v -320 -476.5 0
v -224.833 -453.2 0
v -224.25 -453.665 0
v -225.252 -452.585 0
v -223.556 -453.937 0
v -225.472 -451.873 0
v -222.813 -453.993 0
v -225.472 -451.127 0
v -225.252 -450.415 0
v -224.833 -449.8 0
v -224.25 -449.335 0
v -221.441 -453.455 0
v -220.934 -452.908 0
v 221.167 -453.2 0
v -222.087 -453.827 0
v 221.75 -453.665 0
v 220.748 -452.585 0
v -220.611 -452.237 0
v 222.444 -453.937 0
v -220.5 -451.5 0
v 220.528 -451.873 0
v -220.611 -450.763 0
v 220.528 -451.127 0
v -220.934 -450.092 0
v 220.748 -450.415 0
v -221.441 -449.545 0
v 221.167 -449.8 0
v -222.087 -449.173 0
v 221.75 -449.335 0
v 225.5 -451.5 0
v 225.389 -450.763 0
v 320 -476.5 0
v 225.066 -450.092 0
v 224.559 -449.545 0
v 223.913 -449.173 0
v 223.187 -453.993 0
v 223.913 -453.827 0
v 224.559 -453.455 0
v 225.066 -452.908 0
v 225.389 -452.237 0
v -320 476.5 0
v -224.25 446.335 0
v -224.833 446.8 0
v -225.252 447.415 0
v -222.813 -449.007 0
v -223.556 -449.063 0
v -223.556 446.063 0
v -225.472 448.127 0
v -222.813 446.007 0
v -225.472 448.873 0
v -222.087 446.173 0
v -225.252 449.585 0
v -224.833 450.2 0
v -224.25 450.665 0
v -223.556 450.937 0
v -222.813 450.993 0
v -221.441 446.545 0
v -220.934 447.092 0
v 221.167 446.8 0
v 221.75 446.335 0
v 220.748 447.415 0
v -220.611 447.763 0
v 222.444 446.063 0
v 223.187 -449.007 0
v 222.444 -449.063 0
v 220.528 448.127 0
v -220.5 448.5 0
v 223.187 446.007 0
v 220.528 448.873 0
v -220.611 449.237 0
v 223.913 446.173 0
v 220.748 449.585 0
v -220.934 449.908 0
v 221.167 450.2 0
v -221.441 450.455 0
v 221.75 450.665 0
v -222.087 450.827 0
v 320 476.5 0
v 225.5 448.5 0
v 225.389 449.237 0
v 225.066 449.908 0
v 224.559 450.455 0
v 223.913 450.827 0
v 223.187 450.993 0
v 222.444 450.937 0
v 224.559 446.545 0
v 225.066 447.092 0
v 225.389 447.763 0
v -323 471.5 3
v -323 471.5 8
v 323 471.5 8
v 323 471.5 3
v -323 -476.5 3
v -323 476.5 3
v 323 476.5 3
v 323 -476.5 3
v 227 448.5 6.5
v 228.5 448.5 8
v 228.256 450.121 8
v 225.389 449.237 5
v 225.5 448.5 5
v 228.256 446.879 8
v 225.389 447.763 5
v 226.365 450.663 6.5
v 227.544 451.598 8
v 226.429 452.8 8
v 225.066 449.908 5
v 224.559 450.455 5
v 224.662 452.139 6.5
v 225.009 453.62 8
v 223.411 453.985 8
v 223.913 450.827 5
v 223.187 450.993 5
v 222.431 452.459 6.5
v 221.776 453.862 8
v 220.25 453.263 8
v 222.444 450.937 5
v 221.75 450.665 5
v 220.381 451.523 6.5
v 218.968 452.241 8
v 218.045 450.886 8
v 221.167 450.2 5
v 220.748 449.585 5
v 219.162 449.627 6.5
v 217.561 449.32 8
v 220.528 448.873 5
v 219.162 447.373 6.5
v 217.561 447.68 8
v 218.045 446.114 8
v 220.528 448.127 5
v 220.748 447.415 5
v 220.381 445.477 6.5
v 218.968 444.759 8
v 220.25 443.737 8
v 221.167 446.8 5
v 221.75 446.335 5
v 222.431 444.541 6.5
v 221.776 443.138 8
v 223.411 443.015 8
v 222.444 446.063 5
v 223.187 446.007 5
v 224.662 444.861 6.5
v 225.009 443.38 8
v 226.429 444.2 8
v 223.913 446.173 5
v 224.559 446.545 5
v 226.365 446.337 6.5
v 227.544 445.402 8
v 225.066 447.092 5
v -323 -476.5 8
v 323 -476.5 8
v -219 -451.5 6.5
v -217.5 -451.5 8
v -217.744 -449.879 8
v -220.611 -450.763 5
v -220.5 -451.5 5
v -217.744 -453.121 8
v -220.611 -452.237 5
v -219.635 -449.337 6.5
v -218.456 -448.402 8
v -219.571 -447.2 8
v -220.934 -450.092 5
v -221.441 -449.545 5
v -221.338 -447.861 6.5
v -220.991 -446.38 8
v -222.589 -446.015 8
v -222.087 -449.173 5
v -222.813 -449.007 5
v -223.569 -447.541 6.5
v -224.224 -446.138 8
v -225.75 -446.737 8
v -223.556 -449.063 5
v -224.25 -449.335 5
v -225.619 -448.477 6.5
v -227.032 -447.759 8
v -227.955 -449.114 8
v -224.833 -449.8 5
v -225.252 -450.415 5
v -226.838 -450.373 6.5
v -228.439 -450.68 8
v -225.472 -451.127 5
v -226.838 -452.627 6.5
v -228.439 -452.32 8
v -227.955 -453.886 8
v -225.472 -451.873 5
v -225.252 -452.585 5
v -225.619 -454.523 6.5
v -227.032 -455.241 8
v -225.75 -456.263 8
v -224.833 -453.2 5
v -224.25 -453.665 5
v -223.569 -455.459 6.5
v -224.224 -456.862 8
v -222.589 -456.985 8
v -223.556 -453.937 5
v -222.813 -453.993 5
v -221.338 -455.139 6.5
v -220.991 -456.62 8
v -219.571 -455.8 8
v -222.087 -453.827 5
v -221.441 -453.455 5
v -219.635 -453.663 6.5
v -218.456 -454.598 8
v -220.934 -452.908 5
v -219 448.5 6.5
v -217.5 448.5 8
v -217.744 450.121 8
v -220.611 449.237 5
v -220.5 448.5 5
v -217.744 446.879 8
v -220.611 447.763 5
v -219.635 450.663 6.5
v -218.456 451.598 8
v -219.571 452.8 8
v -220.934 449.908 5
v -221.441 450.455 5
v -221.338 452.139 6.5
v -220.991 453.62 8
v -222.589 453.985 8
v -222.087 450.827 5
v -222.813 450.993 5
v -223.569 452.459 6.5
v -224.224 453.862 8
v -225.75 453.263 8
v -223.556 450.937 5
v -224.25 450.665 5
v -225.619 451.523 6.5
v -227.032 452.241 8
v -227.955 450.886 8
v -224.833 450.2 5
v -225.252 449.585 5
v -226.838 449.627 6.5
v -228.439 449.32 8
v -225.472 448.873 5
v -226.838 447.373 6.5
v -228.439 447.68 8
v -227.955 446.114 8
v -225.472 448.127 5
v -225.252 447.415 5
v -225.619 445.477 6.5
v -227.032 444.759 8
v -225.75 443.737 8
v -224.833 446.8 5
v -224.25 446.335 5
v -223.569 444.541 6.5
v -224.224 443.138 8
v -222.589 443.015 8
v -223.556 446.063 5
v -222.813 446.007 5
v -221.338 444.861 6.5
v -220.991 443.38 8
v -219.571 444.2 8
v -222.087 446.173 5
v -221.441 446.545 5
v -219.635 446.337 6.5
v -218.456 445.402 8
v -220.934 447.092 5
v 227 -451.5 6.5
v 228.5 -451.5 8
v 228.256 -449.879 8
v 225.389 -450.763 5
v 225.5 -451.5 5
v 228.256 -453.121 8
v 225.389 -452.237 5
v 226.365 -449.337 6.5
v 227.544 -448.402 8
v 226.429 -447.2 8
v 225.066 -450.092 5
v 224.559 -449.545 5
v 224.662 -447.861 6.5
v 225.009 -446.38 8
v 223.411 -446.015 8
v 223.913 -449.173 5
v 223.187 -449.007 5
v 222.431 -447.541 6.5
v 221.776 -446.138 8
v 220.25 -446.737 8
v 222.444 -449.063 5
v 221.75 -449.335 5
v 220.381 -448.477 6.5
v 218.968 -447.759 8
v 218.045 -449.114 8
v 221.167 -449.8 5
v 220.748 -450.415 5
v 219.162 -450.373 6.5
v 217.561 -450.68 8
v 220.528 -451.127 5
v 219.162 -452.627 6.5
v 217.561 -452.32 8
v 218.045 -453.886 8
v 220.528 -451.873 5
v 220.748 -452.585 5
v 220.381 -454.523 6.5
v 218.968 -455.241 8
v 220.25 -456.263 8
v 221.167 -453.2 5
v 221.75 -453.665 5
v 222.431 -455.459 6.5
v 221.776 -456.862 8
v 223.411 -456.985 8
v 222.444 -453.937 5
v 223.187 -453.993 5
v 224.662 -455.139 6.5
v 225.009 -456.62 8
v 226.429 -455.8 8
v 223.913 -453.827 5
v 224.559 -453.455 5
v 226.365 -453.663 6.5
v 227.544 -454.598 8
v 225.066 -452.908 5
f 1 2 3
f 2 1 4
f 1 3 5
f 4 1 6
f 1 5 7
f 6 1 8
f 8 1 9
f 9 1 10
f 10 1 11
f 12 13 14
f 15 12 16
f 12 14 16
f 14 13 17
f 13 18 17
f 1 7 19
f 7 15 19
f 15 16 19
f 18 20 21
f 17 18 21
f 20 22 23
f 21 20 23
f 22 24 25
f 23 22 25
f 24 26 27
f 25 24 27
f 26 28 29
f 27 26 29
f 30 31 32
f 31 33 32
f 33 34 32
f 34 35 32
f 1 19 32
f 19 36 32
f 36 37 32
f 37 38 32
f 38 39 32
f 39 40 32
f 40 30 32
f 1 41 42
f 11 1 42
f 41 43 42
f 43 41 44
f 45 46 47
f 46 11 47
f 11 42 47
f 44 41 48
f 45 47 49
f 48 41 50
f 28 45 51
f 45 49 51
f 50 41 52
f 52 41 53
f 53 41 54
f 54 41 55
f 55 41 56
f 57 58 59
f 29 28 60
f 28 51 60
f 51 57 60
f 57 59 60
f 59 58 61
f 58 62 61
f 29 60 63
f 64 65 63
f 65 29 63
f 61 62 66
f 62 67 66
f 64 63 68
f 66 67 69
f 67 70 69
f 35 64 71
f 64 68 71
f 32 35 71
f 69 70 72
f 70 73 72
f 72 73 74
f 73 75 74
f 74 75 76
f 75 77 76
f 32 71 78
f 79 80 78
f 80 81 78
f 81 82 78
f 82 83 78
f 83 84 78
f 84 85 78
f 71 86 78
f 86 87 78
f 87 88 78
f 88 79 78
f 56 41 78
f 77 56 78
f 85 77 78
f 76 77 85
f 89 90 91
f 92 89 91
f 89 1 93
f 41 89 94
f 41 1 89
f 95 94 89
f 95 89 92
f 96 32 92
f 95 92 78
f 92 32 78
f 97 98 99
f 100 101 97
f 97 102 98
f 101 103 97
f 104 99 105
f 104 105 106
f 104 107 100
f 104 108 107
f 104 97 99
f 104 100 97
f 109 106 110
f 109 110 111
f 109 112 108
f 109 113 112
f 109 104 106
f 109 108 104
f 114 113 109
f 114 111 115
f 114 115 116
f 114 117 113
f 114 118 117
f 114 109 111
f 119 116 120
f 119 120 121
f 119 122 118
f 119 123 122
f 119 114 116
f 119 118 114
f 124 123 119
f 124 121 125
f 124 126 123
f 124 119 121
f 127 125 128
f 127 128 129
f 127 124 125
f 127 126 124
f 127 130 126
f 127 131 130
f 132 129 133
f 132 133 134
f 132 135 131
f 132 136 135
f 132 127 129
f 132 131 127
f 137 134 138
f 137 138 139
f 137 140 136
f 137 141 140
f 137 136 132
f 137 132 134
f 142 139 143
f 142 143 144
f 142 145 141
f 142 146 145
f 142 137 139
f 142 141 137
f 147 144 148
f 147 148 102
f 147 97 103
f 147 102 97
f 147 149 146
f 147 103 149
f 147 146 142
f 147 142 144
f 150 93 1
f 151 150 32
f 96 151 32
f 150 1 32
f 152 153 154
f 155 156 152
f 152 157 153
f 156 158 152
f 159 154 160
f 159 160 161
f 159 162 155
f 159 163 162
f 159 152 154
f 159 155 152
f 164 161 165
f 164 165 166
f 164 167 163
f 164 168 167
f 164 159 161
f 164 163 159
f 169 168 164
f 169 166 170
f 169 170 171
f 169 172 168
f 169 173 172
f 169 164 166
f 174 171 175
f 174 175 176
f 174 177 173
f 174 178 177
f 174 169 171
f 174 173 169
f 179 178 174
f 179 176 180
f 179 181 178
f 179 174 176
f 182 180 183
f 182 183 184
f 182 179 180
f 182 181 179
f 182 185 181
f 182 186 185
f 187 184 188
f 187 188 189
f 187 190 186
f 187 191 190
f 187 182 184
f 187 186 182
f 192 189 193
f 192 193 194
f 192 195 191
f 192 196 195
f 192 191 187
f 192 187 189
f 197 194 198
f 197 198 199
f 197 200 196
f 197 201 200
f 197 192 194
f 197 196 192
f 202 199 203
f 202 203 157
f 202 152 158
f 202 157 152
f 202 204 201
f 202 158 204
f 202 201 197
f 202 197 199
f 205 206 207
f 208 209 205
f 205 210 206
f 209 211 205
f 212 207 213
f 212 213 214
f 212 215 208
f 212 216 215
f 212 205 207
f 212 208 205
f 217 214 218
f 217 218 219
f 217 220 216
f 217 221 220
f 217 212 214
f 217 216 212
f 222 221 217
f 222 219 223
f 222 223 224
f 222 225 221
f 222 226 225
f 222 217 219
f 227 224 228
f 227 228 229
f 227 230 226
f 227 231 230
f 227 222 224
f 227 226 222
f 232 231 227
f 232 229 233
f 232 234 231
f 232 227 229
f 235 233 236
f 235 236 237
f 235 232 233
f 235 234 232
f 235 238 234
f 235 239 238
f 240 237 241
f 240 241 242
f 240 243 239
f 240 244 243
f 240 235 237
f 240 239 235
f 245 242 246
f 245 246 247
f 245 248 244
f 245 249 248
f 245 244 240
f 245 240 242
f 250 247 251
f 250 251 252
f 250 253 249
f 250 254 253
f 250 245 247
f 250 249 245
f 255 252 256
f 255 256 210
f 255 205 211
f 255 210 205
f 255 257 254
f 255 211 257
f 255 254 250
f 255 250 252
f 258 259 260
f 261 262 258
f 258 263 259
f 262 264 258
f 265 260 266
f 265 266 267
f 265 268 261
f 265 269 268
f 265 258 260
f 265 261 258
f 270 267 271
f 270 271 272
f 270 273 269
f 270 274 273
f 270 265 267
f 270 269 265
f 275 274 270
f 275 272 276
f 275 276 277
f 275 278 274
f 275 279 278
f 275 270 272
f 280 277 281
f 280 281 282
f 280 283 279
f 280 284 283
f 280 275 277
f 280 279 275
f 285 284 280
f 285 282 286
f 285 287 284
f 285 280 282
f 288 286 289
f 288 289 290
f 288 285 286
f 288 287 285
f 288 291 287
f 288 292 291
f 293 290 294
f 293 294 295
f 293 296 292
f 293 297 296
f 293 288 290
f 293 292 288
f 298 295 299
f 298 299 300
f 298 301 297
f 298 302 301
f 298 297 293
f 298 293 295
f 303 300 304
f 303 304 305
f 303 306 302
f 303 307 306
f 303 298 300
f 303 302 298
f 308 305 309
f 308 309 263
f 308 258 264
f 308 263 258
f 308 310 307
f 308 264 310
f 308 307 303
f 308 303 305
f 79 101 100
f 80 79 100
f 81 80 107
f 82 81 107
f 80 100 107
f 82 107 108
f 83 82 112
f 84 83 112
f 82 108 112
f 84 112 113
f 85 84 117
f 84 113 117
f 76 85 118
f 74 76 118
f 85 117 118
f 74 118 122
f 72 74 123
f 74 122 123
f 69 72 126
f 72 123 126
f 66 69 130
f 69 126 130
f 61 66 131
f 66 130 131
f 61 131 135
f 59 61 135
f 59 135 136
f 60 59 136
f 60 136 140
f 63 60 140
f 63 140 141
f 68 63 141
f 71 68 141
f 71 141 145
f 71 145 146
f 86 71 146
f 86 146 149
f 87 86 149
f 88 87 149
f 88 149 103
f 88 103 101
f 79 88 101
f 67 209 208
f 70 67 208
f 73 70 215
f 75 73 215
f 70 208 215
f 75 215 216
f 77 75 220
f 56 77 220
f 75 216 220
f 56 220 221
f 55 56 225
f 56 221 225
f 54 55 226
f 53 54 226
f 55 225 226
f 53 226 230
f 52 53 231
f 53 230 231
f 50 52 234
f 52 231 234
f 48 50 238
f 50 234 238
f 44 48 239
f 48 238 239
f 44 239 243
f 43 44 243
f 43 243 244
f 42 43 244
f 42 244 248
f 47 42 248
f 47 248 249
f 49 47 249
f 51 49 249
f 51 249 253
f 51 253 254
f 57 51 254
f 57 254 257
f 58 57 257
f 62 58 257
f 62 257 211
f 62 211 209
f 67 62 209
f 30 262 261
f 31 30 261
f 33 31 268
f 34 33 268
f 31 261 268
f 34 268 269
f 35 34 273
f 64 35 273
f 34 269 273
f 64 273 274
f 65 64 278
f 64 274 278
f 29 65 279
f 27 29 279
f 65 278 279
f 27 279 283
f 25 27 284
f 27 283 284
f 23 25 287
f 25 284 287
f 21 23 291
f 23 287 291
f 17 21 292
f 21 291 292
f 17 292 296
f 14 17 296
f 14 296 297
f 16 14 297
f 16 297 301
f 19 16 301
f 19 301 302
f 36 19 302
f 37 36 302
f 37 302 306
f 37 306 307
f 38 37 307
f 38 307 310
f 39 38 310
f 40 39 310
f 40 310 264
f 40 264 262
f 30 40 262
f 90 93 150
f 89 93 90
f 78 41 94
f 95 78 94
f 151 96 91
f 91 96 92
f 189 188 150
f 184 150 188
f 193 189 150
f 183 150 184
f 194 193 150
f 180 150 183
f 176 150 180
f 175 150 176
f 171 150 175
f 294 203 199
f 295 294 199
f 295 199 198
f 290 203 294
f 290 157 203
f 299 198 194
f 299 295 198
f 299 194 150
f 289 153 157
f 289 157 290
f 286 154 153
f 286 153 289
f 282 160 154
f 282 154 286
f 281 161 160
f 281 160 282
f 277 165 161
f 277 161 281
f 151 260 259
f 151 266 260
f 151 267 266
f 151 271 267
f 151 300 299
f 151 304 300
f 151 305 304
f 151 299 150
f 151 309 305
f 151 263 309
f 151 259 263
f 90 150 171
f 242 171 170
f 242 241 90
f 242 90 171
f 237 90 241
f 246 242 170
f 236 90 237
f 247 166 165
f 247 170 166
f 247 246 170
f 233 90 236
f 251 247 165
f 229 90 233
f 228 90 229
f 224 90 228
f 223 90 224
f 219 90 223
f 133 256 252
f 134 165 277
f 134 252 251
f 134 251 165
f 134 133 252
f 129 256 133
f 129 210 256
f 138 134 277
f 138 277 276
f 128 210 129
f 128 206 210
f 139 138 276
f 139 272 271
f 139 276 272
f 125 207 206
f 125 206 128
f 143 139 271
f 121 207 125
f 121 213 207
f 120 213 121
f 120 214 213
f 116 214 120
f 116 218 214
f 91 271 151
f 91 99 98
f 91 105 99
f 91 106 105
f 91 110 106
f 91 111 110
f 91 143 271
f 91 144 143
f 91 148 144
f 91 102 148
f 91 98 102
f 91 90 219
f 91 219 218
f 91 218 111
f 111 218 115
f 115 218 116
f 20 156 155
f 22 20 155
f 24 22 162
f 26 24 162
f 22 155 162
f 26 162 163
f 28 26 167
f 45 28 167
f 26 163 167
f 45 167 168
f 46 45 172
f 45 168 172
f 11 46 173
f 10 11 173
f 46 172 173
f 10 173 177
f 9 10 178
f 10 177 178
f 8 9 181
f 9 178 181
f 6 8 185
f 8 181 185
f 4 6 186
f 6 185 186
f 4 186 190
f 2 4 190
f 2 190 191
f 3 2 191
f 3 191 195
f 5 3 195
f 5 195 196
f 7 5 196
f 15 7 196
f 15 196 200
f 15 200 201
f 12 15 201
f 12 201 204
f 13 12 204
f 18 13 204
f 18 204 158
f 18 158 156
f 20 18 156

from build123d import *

# Parameters (mm, degrees)
SKETCH1_W           = 646
SKETCH1_H           = 953
BOSS_EXTRUDE1_DEPTH = 8
CHAMFER1_SIZE       = 3
SKETCH3_R           = 2.5
CUT_EXTRUDE2_DEPTH  = 9
CHAMFER2_SIZE       = 3
SKETCH2_W           = 646
SKETCH2_H           = 5
CUT_EXTRUDE3_DEPTH  = 5


with BuildPart() as part:
    # Sketch1 → Boss-Extrude1 (new body)
    with BuildSketch(Plane.XY):
        Rectangle(SKETCH1_W, SKETCH1_H)
    extrude(amount=BOSS_EXTRUDE1_DEPTH)

    # Chamfer1
    chamfer1_edges = [part.edges().sort_by_distance(p)[0] for p in [
        (-323, 0, 0),
        (323, 0, 0),
    ]]
    chamfer(chamfer1_edges, length=CHAMFER1_SIZE)

    # Sketch3 → Cut-Extrude2 (cut, through all)
    with BuildSketch(Plane.XY.offset(8)):
        with Locations((-223, 448.5)):
            Circle(SKETCH3_R)
        with Locations((-223, -451.5)):
            Circle(SKETCH3_R)
        with Locations((223, -451.5)):
            Circle(SKETCH3_R)
        with Locations((223, 448.5)):
            Circle(SKETCH3_R)
    extrude(amount=-CUT_EXTRUDE2_DEPTH, mode=Mode.SUBTRACT)

    # Chamfer2
    chamfer2_edges = [part.edges().sort_by_distance(p)[0] for p in [
        (-225.5, 448.5, 8),
        (-225.5, -451.5, 8),
        (220.5, -451.5, 8),
        (220.5, 448.5, 8),
    ]]
    chamfer(chamfer2_edges, length=CHAMFER2_SIZE)

    # Sketch2 → Cut-Extrude3 (cut)
    with BuildSketch(Plane.XY.offset(8)):
        with Locations((0, 474)):
            Rectangle(SKETCH2_W, SKETCH2_H)
    extrude(amount=-CUT_EXTRUDE3_DEPTH, mode=Mode.SUBTRACT)


solid = part.part
